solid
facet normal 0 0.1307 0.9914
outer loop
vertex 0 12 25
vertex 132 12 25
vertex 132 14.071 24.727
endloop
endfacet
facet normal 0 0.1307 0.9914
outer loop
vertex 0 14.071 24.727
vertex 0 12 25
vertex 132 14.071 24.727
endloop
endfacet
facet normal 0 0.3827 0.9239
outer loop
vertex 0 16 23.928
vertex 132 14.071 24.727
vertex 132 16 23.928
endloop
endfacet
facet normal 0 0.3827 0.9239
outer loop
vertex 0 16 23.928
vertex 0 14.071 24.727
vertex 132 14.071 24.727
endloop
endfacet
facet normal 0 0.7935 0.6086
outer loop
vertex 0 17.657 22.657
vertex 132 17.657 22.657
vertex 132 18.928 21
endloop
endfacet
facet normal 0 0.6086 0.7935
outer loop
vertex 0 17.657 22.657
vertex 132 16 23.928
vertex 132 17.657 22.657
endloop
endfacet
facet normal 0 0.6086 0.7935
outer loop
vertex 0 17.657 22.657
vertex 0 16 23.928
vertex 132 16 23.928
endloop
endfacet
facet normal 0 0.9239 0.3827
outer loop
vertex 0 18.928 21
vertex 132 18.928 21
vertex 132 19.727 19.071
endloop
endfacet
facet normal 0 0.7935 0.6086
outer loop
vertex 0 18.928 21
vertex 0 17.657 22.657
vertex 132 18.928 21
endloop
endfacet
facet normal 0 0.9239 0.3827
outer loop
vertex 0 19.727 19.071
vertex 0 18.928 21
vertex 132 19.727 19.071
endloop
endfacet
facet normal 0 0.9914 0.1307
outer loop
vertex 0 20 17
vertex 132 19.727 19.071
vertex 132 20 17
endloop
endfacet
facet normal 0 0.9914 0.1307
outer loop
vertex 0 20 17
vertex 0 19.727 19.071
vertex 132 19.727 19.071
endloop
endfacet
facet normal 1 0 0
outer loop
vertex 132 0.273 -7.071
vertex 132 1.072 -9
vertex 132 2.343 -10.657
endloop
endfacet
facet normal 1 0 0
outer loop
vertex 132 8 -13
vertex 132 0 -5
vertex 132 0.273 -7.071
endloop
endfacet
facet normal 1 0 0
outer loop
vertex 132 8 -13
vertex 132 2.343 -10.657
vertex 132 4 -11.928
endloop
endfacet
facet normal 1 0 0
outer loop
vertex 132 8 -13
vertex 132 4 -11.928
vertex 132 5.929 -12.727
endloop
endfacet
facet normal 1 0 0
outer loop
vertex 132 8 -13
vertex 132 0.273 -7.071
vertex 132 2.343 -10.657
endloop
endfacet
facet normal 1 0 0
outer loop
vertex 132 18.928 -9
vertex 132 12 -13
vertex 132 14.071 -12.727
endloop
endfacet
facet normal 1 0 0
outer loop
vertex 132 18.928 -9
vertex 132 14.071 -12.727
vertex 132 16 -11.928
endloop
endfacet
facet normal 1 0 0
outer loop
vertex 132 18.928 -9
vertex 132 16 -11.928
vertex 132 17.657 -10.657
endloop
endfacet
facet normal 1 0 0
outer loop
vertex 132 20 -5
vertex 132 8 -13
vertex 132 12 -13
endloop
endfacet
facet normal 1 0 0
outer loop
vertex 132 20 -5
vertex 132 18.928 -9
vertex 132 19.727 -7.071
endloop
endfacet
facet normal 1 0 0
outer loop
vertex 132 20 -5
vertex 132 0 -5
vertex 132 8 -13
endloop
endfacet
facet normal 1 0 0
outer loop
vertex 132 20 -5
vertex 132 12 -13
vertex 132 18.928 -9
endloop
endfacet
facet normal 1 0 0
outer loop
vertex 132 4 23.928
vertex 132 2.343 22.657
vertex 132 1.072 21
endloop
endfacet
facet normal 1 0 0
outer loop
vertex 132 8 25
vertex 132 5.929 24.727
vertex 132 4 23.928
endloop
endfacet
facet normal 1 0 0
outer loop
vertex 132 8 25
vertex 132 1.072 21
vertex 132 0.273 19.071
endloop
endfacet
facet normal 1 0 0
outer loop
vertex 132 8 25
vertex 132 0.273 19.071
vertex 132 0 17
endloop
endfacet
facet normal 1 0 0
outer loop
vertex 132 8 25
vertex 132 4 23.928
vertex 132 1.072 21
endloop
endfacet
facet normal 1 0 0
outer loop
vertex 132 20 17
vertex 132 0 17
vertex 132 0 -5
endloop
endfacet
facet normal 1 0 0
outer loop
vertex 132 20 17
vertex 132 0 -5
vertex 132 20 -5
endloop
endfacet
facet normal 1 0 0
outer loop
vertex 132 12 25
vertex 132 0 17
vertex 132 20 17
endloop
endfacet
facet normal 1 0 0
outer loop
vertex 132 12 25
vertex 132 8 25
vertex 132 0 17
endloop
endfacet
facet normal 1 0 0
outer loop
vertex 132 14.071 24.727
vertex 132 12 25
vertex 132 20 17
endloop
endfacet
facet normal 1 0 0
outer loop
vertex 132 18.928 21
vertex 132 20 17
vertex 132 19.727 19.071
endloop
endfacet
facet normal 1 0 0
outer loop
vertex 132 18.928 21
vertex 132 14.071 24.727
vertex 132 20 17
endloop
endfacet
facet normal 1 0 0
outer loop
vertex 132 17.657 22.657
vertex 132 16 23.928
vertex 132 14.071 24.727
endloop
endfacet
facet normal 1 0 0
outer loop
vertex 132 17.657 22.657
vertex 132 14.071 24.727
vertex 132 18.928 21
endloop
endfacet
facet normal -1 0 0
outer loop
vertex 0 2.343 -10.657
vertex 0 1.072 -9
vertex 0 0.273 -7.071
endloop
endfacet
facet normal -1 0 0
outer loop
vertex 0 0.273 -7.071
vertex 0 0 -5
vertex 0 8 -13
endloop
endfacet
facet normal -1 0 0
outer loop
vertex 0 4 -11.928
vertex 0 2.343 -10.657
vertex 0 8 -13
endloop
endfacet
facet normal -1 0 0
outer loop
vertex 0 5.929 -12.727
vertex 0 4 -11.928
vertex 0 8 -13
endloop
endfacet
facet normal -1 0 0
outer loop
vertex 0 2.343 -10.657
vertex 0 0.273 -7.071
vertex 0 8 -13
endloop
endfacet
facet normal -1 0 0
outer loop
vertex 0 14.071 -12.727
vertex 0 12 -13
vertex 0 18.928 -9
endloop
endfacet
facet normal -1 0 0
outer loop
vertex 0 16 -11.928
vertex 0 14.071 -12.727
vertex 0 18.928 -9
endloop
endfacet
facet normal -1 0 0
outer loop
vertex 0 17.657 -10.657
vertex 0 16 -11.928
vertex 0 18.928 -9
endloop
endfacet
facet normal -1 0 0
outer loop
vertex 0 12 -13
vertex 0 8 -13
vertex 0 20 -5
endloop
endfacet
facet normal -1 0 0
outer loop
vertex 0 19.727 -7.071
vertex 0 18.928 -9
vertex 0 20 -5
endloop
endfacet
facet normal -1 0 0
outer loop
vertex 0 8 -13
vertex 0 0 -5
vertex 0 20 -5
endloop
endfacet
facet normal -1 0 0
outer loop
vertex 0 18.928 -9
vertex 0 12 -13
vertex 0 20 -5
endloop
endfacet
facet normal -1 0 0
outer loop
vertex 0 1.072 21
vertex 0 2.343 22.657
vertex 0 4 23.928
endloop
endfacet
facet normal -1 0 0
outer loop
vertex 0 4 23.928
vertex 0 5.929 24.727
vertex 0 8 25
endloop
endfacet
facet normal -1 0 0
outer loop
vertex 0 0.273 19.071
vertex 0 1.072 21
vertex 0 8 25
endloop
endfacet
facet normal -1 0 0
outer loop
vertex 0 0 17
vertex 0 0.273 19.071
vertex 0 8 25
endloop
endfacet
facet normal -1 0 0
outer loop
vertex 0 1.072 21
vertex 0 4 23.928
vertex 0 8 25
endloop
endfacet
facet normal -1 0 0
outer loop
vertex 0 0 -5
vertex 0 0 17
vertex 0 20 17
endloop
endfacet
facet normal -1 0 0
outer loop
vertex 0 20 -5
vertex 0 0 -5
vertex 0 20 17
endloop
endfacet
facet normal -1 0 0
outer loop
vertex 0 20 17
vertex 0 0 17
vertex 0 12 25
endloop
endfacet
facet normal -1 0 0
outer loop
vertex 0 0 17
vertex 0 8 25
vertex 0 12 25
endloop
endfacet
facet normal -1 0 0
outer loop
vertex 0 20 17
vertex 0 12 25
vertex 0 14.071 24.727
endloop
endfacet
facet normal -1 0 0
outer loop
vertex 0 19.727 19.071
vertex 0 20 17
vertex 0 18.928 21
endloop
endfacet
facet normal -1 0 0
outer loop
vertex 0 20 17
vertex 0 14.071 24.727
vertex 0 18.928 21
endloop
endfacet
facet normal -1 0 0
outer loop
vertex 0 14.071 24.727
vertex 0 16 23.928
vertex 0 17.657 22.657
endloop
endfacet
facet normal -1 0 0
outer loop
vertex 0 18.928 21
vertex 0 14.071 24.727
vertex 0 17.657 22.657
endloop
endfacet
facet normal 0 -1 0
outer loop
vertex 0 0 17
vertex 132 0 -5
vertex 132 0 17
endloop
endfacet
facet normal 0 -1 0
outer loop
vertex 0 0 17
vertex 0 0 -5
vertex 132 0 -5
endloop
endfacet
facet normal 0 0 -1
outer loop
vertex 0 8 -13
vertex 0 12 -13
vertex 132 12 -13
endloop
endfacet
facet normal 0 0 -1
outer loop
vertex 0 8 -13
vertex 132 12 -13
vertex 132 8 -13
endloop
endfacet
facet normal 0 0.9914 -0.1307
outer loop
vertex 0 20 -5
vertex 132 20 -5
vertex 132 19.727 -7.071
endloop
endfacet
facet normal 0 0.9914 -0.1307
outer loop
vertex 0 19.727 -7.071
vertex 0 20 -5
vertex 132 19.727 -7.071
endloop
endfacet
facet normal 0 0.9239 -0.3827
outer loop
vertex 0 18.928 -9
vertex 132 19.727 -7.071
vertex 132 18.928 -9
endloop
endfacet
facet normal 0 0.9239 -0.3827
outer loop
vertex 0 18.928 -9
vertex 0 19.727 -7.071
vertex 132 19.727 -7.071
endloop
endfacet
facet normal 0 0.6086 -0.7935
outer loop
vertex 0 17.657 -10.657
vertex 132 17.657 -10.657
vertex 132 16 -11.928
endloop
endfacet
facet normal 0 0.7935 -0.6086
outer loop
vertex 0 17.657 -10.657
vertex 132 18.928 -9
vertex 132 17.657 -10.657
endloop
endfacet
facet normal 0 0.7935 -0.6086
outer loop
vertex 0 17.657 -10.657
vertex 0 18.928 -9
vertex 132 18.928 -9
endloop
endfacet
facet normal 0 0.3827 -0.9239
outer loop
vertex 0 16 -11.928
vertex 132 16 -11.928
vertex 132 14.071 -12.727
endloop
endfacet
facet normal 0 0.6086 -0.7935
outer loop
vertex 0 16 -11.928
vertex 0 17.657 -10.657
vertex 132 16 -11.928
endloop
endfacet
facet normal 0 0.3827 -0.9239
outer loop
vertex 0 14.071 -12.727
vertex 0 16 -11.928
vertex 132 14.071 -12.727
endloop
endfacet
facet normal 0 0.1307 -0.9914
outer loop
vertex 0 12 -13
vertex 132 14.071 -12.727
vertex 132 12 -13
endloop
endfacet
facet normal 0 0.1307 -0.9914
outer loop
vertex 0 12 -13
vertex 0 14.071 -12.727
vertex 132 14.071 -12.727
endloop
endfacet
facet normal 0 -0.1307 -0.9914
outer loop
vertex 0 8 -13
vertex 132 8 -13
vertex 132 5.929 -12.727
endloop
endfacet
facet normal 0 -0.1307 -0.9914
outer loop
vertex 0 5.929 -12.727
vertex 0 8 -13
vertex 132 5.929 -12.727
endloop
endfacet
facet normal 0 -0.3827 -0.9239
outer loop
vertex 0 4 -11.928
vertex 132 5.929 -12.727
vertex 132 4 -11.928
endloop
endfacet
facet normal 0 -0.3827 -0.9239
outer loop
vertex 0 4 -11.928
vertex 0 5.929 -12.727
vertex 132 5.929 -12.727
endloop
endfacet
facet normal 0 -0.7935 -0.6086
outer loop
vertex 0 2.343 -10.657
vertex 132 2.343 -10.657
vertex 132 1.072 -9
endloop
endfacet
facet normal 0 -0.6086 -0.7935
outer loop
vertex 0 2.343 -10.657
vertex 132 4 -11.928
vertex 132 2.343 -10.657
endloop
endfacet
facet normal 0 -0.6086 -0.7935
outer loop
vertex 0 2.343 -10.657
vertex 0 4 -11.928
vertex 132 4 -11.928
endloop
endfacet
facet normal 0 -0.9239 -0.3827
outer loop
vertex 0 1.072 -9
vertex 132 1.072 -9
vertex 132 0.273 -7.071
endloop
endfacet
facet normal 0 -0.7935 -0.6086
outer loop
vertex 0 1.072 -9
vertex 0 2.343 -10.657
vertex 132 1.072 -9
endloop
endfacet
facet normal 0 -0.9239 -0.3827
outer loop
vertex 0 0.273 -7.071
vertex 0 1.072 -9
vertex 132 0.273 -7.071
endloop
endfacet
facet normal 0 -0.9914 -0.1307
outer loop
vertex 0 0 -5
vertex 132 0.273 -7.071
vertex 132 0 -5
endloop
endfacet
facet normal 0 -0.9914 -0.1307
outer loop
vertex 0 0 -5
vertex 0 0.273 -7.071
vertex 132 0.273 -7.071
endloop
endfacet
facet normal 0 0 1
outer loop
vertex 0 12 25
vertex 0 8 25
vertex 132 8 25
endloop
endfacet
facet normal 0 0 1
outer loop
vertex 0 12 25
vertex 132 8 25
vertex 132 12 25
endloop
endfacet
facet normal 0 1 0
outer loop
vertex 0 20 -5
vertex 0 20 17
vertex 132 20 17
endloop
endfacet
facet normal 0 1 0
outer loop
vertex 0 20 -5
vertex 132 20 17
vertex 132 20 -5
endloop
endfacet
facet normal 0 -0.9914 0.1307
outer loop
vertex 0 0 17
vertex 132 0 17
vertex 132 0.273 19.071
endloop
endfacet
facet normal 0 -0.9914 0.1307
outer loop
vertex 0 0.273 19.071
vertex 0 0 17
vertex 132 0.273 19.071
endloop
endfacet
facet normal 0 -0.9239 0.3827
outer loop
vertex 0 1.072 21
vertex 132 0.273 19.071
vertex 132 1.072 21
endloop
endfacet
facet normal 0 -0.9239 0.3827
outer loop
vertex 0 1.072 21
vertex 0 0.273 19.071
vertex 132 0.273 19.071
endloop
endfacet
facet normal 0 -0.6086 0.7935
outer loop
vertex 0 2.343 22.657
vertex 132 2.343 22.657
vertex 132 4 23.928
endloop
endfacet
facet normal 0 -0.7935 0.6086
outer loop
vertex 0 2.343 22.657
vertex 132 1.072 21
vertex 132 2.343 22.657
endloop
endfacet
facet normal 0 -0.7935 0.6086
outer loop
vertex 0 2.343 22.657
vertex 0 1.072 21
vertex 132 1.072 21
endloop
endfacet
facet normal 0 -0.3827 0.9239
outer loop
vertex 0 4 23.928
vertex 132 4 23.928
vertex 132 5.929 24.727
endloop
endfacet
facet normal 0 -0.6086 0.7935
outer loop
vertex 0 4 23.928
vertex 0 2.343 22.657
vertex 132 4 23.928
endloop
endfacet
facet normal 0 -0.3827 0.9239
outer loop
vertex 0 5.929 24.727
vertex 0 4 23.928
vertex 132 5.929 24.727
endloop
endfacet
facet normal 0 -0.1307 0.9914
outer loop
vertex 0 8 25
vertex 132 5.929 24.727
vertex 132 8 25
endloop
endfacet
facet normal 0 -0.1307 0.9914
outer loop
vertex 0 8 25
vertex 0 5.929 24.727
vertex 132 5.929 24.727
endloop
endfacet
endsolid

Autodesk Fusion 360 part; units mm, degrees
sketch "Szkic1" plane through (0, 0, 0) normal (1, 0, 0) x (0, 1, 0)
  line L0 (8, 25) -> (12, 25)
  line L1 (20, 17) -> (20, -5)
  line L2 (12, -13) -> (8, -13)
  line L3 (0, -5) -> (0, 17)
  arc A0 (8, 25) -> (0, 17) centre (8, 17) ccw
  arc A1 (20, 17) -> (12, 25) centre (12, 17) ccw
  arc A2 (12, -13) -> (20, -5) centre (12, -5) ccw
  arc A3 (0, -5) -> (8, -13) centre (8, -5) ccw
  point P0 (0, 25)
  point P1 (20, 25)
  point P2 (20, -13)
  dimension "d1" = 20
  dimension "d2" = 38
  dimension "d3" = 8
  dimension "d4" = 8
extrude "Wyciągnięcie proste1" add sketch "Szkic1" along normal blind 132
